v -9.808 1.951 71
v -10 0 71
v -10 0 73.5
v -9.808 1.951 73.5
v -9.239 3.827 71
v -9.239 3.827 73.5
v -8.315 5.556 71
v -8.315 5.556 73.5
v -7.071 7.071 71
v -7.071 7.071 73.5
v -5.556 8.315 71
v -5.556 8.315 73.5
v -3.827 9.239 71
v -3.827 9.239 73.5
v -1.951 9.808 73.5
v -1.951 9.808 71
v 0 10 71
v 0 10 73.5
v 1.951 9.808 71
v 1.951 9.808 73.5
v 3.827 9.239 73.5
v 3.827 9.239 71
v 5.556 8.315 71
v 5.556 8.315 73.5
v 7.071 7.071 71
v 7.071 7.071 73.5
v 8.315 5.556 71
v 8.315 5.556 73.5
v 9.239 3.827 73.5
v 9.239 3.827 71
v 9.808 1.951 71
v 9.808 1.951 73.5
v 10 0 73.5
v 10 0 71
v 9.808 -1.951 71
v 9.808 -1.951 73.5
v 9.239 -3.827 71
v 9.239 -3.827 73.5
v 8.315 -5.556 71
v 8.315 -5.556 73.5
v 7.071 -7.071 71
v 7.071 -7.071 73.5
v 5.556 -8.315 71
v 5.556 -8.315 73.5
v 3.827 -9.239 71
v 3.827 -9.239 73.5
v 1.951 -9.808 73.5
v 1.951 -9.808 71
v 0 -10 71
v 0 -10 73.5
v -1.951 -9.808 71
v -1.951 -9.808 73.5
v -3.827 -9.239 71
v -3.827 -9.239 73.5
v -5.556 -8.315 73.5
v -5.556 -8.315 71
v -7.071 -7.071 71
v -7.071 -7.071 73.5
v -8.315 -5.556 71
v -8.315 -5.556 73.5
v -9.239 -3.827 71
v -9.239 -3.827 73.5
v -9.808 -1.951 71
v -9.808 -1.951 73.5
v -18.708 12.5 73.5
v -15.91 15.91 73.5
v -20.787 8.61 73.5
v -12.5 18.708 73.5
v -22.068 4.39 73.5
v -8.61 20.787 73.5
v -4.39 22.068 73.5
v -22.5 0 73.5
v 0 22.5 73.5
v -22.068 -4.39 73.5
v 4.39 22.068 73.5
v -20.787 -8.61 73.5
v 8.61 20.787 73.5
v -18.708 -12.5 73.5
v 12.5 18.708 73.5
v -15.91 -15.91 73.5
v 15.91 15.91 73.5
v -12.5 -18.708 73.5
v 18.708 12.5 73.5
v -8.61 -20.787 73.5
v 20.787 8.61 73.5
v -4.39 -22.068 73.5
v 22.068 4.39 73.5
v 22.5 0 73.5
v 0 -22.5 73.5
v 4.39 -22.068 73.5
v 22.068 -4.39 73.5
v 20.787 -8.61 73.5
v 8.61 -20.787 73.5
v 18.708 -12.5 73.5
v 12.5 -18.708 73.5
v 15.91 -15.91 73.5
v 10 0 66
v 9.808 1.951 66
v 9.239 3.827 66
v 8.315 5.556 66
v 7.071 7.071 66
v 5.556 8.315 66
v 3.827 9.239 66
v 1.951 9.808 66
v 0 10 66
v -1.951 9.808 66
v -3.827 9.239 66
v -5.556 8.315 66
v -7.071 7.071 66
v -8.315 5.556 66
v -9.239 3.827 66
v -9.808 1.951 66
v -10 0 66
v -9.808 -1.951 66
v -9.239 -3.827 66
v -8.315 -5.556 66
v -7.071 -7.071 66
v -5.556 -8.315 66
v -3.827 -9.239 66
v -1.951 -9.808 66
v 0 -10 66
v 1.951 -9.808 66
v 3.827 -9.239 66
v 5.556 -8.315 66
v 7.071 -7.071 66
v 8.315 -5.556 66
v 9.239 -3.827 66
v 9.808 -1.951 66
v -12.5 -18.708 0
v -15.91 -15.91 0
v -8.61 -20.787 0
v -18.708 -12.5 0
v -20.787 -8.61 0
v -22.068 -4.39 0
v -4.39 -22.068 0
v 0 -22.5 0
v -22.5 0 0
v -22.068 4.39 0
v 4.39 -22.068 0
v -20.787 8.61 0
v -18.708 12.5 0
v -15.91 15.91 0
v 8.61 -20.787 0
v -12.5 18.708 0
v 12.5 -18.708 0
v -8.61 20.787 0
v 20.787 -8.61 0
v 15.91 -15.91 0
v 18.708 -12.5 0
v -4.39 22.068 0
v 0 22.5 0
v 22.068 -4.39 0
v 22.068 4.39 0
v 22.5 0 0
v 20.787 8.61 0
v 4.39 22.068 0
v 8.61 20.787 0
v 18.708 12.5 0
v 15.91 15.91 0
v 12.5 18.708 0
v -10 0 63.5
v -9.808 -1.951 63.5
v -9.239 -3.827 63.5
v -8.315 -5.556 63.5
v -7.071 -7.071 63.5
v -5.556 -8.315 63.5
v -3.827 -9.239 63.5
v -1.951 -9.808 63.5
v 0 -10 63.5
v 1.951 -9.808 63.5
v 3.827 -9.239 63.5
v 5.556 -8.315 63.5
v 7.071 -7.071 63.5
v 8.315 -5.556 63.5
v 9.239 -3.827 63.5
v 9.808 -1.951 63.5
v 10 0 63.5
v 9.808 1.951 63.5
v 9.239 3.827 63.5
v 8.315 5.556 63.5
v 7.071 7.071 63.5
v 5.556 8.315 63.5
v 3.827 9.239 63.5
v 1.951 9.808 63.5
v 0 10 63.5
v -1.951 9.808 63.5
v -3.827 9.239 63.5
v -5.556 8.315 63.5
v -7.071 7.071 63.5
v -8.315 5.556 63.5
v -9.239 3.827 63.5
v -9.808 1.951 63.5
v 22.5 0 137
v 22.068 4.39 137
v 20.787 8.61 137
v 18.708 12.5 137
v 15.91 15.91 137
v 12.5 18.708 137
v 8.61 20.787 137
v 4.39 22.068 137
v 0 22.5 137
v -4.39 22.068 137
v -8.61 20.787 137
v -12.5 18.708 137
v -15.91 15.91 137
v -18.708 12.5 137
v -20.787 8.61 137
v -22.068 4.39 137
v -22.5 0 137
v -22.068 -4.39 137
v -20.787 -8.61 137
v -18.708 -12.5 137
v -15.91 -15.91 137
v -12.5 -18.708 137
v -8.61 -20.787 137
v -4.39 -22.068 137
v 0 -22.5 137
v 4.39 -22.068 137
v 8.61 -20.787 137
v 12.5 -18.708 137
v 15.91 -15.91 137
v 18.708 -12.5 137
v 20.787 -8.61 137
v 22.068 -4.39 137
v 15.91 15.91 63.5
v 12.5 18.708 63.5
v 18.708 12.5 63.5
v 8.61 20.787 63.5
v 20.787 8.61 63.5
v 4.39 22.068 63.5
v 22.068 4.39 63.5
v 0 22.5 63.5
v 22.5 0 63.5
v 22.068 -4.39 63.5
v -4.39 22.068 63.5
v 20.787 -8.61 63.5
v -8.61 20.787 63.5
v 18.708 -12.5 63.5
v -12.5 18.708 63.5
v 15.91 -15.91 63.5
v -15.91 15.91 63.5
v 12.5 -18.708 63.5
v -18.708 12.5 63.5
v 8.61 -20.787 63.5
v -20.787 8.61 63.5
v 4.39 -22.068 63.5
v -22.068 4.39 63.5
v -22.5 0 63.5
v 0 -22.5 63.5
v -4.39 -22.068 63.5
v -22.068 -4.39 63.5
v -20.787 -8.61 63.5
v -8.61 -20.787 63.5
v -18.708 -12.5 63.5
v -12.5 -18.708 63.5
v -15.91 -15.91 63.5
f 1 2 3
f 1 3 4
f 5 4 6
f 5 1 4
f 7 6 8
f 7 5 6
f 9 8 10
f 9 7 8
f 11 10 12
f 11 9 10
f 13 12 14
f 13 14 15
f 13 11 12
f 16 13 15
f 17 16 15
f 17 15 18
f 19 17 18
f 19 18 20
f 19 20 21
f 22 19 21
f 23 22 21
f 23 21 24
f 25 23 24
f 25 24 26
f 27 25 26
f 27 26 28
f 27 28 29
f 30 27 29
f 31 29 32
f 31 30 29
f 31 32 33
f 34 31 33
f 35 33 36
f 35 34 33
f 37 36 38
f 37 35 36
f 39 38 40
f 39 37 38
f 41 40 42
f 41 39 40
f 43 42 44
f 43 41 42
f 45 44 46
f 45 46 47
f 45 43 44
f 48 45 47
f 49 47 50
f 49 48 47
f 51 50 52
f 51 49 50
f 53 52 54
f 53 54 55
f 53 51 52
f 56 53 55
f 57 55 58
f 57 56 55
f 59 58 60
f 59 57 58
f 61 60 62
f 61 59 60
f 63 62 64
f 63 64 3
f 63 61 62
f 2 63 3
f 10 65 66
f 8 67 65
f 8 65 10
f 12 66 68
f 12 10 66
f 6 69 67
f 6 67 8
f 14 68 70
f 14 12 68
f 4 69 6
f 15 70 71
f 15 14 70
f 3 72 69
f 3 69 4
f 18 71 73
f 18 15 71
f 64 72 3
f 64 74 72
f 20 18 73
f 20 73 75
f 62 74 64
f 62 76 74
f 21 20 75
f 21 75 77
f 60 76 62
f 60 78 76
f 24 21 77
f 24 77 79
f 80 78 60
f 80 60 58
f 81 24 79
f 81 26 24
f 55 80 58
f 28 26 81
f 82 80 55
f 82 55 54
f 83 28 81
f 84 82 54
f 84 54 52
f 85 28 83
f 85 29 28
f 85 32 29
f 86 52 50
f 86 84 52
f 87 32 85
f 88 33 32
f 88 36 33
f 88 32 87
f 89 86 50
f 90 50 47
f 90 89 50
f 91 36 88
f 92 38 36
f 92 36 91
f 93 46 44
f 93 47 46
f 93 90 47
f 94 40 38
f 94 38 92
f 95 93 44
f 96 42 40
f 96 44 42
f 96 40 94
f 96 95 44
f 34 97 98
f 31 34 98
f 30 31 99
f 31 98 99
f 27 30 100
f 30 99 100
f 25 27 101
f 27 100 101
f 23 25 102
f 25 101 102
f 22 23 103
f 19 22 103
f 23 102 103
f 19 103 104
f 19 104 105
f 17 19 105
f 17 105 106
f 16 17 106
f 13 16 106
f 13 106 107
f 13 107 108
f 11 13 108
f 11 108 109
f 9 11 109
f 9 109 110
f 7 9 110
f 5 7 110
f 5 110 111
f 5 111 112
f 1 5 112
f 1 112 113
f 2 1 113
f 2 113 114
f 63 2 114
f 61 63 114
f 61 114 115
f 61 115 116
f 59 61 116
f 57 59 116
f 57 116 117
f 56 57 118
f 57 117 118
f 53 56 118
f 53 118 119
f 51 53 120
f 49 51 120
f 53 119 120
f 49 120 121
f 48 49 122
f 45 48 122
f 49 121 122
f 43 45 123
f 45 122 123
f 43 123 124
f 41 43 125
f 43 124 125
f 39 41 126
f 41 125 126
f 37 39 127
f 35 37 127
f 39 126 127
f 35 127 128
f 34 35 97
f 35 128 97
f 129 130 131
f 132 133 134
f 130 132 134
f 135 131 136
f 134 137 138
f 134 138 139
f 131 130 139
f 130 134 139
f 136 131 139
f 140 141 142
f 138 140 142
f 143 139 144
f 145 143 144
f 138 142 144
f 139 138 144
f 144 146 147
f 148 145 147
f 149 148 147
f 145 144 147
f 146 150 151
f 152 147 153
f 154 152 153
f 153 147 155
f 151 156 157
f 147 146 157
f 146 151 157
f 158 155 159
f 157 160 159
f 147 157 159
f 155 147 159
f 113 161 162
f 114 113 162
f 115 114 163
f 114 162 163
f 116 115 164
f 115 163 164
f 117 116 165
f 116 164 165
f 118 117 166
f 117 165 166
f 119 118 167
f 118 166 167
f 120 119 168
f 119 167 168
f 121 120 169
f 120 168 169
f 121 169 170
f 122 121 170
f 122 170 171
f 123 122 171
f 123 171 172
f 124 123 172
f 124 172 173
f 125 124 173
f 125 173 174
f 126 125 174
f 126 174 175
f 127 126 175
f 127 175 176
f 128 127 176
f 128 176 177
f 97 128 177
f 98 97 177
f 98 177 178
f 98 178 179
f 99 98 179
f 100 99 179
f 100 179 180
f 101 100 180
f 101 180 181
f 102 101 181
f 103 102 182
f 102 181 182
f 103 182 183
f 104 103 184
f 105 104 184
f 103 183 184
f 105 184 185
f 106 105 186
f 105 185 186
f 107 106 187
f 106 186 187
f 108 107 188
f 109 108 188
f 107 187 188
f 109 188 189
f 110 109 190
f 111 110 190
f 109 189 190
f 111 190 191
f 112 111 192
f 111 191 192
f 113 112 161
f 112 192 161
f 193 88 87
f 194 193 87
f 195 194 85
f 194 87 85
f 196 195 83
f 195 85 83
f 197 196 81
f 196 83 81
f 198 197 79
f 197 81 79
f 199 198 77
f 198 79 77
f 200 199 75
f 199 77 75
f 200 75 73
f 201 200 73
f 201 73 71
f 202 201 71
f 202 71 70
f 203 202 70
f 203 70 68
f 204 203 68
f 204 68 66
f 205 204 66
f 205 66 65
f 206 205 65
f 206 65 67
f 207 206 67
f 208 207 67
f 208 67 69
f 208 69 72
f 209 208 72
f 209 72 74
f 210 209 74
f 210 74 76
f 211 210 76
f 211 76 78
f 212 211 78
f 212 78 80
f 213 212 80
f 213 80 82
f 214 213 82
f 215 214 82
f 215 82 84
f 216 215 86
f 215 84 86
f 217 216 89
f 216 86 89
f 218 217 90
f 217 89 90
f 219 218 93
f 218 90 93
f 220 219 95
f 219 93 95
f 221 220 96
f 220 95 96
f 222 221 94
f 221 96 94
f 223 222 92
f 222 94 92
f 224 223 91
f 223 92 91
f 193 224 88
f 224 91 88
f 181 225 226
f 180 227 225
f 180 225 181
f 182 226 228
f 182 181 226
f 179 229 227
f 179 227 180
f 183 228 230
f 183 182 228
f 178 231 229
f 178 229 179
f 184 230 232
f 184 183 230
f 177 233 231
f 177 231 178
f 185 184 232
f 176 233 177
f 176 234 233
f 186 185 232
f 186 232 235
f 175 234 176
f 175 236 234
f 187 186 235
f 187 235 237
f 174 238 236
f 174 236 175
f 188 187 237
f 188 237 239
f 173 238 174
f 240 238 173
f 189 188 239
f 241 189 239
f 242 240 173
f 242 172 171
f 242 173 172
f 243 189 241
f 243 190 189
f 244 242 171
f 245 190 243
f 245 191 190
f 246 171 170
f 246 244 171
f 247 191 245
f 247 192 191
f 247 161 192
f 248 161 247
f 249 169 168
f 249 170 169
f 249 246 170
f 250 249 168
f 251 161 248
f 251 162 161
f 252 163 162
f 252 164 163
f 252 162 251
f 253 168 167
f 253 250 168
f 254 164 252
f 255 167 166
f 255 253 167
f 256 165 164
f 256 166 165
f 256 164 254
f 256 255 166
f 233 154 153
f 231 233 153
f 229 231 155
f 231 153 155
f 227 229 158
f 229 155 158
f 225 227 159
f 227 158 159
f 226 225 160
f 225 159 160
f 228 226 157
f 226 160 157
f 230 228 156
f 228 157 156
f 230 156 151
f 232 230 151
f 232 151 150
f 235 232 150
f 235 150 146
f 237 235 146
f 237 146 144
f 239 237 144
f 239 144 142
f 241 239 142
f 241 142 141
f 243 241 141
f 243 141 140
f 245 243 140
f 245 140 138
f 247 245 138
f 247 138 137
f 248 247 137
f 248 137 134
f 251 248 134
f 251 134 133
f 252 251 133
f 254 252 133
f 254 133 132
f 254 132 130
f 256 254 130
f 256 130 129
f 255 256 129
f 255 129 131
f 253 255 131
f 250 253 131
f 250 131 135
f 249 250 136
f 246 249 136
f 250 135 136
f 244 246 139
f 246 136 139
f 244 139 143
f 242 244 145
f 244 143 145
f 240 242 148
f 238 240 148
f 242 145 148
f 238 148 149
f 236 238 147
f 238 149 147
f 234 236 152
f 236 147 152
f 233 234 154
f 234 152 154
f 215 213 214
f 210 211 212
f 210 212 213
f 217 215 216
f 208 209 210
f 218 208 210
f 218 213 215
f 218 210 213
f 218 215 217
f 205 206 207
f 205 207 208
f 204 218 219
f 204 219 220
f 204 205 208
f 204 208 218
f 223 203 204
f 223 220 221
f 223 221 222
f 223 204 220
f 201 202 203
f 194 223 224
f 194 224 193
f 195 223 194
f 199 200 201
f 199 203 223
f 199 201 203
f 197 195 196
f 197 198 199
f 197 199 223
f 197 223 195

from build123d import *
from build123d.topology import SkipClean

# Parameters (mm, degrees)
SKETCH1_R           = 22.5
BOSS_EXTRUDE1_DEPTH = 66
SKETCH2_R           = 10
BOSS_EXTRUDE2_DEPTH = 5
SKETCH3_R           = 22.5
BOSS_EXTRUDE3_DEPTH = 66
SKETCH4_R           = 22.5
SKETCH4_R_2         = 10
CUT_EXTRUDE2_DEPTH  = 2.5
CUT_EXTRUDE3_START  = -2.5
SKETCH5_R           = 22.5
SKETCH5_R_2         = 10
CUT_EXTRUDE3_DEPTH  = 2.5


with BuildPart() as part:
    # Sketch1 → Boss-Extrude1 (new body)
    with BuildSketch(Plane.XY):
        Circle(SKETCH1_R)
    extrude(amount=BOSS_EXTRUDE1_DEPTH)

    # Sketch2 → Boss-Extrude2 (add)
    with BuildSketch(Plane.XY.offset(66)):
        Circle(SKETCH2_R)
    extrude(amount=BOSS_EXTRUDE2_DEPTH)

    # Sketch3 → Boss-Extrude3 (add)
    with BuildSketch(Plane.XY.offset(71)):
        Circle(SKETCH3_R)
    extrude(amount=BOSS_EXTRUDE3_DEPTH)

    # Sketch4 → Cut-Extrude2 (cut)
    with SkipClean():  # the faces are left unmerged after this step: merging them gives an invalid solid
        with BuildSketch(Plane(origin=(0, 0, 71), x_dir=(-1, 0, 0), z_dir=(0, 0, -1))):
            with Locations(Location((0, 0, 0), (0, 0, 180))):
                Circle(SKETCH4_R)
            Circle(SKETCH4_R_2, mode=Mode.SUBTRACT)
        extrude(amount=-CUT_EXTRUDE2_DEPTH, mode=Mode.SUBTRACT)

    # Sketch5 → Cut-Extrude3 (cut)
    with SkipClean():  # the faces are left unmerged after this step: merging them gives an invalid solid
        with BuildSketch(Plane.XY.offset(66).offset(CUT_EXTRUDE3_START)):
            with Locations(Location((0, 0, 0), (0, 0, 180))):
                Circle(SKETCH5_R)
            with Locations(Location((0, 0, 0), (0, 0, 180))):
                Circle(SKETCH5_R_2, mode=Mode.SUBTRACT)
        extrude(amount=CUT_EXTRUDE3_DEPTH, mode=Mode.SUBTRACT)


solid = part.part
